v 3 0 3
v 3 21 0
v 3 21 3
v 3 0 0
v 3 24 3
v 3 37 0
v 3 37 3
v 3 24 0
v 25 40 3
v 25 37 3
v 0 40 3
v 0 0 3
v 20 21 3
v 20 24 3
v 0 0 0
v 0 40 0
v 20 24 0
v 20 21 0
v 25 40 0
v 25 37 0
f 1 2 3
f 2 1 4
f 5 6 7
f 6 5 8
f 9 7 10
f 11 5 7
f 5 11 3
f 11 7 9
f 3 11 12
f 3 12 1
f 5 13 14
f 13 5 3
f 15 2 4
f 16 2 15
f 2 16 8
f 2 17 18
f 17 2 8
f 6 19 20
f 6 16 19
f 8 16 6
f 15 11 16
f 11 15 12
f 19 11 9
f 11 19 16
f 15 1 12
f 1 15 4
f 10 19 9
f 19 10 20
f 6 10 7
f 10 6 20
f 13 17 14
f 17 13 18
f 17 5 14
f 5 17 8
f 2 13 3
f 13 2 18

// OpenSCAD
z=3; //толшина
x=20; //высота и длинна

 union(){
  cube([z,x+x,z]);
  translate([0,x+x-3,0]) cube([x+5,z,z]);
  translate([0,x+1,0]) cube([x,z,z]);
}
